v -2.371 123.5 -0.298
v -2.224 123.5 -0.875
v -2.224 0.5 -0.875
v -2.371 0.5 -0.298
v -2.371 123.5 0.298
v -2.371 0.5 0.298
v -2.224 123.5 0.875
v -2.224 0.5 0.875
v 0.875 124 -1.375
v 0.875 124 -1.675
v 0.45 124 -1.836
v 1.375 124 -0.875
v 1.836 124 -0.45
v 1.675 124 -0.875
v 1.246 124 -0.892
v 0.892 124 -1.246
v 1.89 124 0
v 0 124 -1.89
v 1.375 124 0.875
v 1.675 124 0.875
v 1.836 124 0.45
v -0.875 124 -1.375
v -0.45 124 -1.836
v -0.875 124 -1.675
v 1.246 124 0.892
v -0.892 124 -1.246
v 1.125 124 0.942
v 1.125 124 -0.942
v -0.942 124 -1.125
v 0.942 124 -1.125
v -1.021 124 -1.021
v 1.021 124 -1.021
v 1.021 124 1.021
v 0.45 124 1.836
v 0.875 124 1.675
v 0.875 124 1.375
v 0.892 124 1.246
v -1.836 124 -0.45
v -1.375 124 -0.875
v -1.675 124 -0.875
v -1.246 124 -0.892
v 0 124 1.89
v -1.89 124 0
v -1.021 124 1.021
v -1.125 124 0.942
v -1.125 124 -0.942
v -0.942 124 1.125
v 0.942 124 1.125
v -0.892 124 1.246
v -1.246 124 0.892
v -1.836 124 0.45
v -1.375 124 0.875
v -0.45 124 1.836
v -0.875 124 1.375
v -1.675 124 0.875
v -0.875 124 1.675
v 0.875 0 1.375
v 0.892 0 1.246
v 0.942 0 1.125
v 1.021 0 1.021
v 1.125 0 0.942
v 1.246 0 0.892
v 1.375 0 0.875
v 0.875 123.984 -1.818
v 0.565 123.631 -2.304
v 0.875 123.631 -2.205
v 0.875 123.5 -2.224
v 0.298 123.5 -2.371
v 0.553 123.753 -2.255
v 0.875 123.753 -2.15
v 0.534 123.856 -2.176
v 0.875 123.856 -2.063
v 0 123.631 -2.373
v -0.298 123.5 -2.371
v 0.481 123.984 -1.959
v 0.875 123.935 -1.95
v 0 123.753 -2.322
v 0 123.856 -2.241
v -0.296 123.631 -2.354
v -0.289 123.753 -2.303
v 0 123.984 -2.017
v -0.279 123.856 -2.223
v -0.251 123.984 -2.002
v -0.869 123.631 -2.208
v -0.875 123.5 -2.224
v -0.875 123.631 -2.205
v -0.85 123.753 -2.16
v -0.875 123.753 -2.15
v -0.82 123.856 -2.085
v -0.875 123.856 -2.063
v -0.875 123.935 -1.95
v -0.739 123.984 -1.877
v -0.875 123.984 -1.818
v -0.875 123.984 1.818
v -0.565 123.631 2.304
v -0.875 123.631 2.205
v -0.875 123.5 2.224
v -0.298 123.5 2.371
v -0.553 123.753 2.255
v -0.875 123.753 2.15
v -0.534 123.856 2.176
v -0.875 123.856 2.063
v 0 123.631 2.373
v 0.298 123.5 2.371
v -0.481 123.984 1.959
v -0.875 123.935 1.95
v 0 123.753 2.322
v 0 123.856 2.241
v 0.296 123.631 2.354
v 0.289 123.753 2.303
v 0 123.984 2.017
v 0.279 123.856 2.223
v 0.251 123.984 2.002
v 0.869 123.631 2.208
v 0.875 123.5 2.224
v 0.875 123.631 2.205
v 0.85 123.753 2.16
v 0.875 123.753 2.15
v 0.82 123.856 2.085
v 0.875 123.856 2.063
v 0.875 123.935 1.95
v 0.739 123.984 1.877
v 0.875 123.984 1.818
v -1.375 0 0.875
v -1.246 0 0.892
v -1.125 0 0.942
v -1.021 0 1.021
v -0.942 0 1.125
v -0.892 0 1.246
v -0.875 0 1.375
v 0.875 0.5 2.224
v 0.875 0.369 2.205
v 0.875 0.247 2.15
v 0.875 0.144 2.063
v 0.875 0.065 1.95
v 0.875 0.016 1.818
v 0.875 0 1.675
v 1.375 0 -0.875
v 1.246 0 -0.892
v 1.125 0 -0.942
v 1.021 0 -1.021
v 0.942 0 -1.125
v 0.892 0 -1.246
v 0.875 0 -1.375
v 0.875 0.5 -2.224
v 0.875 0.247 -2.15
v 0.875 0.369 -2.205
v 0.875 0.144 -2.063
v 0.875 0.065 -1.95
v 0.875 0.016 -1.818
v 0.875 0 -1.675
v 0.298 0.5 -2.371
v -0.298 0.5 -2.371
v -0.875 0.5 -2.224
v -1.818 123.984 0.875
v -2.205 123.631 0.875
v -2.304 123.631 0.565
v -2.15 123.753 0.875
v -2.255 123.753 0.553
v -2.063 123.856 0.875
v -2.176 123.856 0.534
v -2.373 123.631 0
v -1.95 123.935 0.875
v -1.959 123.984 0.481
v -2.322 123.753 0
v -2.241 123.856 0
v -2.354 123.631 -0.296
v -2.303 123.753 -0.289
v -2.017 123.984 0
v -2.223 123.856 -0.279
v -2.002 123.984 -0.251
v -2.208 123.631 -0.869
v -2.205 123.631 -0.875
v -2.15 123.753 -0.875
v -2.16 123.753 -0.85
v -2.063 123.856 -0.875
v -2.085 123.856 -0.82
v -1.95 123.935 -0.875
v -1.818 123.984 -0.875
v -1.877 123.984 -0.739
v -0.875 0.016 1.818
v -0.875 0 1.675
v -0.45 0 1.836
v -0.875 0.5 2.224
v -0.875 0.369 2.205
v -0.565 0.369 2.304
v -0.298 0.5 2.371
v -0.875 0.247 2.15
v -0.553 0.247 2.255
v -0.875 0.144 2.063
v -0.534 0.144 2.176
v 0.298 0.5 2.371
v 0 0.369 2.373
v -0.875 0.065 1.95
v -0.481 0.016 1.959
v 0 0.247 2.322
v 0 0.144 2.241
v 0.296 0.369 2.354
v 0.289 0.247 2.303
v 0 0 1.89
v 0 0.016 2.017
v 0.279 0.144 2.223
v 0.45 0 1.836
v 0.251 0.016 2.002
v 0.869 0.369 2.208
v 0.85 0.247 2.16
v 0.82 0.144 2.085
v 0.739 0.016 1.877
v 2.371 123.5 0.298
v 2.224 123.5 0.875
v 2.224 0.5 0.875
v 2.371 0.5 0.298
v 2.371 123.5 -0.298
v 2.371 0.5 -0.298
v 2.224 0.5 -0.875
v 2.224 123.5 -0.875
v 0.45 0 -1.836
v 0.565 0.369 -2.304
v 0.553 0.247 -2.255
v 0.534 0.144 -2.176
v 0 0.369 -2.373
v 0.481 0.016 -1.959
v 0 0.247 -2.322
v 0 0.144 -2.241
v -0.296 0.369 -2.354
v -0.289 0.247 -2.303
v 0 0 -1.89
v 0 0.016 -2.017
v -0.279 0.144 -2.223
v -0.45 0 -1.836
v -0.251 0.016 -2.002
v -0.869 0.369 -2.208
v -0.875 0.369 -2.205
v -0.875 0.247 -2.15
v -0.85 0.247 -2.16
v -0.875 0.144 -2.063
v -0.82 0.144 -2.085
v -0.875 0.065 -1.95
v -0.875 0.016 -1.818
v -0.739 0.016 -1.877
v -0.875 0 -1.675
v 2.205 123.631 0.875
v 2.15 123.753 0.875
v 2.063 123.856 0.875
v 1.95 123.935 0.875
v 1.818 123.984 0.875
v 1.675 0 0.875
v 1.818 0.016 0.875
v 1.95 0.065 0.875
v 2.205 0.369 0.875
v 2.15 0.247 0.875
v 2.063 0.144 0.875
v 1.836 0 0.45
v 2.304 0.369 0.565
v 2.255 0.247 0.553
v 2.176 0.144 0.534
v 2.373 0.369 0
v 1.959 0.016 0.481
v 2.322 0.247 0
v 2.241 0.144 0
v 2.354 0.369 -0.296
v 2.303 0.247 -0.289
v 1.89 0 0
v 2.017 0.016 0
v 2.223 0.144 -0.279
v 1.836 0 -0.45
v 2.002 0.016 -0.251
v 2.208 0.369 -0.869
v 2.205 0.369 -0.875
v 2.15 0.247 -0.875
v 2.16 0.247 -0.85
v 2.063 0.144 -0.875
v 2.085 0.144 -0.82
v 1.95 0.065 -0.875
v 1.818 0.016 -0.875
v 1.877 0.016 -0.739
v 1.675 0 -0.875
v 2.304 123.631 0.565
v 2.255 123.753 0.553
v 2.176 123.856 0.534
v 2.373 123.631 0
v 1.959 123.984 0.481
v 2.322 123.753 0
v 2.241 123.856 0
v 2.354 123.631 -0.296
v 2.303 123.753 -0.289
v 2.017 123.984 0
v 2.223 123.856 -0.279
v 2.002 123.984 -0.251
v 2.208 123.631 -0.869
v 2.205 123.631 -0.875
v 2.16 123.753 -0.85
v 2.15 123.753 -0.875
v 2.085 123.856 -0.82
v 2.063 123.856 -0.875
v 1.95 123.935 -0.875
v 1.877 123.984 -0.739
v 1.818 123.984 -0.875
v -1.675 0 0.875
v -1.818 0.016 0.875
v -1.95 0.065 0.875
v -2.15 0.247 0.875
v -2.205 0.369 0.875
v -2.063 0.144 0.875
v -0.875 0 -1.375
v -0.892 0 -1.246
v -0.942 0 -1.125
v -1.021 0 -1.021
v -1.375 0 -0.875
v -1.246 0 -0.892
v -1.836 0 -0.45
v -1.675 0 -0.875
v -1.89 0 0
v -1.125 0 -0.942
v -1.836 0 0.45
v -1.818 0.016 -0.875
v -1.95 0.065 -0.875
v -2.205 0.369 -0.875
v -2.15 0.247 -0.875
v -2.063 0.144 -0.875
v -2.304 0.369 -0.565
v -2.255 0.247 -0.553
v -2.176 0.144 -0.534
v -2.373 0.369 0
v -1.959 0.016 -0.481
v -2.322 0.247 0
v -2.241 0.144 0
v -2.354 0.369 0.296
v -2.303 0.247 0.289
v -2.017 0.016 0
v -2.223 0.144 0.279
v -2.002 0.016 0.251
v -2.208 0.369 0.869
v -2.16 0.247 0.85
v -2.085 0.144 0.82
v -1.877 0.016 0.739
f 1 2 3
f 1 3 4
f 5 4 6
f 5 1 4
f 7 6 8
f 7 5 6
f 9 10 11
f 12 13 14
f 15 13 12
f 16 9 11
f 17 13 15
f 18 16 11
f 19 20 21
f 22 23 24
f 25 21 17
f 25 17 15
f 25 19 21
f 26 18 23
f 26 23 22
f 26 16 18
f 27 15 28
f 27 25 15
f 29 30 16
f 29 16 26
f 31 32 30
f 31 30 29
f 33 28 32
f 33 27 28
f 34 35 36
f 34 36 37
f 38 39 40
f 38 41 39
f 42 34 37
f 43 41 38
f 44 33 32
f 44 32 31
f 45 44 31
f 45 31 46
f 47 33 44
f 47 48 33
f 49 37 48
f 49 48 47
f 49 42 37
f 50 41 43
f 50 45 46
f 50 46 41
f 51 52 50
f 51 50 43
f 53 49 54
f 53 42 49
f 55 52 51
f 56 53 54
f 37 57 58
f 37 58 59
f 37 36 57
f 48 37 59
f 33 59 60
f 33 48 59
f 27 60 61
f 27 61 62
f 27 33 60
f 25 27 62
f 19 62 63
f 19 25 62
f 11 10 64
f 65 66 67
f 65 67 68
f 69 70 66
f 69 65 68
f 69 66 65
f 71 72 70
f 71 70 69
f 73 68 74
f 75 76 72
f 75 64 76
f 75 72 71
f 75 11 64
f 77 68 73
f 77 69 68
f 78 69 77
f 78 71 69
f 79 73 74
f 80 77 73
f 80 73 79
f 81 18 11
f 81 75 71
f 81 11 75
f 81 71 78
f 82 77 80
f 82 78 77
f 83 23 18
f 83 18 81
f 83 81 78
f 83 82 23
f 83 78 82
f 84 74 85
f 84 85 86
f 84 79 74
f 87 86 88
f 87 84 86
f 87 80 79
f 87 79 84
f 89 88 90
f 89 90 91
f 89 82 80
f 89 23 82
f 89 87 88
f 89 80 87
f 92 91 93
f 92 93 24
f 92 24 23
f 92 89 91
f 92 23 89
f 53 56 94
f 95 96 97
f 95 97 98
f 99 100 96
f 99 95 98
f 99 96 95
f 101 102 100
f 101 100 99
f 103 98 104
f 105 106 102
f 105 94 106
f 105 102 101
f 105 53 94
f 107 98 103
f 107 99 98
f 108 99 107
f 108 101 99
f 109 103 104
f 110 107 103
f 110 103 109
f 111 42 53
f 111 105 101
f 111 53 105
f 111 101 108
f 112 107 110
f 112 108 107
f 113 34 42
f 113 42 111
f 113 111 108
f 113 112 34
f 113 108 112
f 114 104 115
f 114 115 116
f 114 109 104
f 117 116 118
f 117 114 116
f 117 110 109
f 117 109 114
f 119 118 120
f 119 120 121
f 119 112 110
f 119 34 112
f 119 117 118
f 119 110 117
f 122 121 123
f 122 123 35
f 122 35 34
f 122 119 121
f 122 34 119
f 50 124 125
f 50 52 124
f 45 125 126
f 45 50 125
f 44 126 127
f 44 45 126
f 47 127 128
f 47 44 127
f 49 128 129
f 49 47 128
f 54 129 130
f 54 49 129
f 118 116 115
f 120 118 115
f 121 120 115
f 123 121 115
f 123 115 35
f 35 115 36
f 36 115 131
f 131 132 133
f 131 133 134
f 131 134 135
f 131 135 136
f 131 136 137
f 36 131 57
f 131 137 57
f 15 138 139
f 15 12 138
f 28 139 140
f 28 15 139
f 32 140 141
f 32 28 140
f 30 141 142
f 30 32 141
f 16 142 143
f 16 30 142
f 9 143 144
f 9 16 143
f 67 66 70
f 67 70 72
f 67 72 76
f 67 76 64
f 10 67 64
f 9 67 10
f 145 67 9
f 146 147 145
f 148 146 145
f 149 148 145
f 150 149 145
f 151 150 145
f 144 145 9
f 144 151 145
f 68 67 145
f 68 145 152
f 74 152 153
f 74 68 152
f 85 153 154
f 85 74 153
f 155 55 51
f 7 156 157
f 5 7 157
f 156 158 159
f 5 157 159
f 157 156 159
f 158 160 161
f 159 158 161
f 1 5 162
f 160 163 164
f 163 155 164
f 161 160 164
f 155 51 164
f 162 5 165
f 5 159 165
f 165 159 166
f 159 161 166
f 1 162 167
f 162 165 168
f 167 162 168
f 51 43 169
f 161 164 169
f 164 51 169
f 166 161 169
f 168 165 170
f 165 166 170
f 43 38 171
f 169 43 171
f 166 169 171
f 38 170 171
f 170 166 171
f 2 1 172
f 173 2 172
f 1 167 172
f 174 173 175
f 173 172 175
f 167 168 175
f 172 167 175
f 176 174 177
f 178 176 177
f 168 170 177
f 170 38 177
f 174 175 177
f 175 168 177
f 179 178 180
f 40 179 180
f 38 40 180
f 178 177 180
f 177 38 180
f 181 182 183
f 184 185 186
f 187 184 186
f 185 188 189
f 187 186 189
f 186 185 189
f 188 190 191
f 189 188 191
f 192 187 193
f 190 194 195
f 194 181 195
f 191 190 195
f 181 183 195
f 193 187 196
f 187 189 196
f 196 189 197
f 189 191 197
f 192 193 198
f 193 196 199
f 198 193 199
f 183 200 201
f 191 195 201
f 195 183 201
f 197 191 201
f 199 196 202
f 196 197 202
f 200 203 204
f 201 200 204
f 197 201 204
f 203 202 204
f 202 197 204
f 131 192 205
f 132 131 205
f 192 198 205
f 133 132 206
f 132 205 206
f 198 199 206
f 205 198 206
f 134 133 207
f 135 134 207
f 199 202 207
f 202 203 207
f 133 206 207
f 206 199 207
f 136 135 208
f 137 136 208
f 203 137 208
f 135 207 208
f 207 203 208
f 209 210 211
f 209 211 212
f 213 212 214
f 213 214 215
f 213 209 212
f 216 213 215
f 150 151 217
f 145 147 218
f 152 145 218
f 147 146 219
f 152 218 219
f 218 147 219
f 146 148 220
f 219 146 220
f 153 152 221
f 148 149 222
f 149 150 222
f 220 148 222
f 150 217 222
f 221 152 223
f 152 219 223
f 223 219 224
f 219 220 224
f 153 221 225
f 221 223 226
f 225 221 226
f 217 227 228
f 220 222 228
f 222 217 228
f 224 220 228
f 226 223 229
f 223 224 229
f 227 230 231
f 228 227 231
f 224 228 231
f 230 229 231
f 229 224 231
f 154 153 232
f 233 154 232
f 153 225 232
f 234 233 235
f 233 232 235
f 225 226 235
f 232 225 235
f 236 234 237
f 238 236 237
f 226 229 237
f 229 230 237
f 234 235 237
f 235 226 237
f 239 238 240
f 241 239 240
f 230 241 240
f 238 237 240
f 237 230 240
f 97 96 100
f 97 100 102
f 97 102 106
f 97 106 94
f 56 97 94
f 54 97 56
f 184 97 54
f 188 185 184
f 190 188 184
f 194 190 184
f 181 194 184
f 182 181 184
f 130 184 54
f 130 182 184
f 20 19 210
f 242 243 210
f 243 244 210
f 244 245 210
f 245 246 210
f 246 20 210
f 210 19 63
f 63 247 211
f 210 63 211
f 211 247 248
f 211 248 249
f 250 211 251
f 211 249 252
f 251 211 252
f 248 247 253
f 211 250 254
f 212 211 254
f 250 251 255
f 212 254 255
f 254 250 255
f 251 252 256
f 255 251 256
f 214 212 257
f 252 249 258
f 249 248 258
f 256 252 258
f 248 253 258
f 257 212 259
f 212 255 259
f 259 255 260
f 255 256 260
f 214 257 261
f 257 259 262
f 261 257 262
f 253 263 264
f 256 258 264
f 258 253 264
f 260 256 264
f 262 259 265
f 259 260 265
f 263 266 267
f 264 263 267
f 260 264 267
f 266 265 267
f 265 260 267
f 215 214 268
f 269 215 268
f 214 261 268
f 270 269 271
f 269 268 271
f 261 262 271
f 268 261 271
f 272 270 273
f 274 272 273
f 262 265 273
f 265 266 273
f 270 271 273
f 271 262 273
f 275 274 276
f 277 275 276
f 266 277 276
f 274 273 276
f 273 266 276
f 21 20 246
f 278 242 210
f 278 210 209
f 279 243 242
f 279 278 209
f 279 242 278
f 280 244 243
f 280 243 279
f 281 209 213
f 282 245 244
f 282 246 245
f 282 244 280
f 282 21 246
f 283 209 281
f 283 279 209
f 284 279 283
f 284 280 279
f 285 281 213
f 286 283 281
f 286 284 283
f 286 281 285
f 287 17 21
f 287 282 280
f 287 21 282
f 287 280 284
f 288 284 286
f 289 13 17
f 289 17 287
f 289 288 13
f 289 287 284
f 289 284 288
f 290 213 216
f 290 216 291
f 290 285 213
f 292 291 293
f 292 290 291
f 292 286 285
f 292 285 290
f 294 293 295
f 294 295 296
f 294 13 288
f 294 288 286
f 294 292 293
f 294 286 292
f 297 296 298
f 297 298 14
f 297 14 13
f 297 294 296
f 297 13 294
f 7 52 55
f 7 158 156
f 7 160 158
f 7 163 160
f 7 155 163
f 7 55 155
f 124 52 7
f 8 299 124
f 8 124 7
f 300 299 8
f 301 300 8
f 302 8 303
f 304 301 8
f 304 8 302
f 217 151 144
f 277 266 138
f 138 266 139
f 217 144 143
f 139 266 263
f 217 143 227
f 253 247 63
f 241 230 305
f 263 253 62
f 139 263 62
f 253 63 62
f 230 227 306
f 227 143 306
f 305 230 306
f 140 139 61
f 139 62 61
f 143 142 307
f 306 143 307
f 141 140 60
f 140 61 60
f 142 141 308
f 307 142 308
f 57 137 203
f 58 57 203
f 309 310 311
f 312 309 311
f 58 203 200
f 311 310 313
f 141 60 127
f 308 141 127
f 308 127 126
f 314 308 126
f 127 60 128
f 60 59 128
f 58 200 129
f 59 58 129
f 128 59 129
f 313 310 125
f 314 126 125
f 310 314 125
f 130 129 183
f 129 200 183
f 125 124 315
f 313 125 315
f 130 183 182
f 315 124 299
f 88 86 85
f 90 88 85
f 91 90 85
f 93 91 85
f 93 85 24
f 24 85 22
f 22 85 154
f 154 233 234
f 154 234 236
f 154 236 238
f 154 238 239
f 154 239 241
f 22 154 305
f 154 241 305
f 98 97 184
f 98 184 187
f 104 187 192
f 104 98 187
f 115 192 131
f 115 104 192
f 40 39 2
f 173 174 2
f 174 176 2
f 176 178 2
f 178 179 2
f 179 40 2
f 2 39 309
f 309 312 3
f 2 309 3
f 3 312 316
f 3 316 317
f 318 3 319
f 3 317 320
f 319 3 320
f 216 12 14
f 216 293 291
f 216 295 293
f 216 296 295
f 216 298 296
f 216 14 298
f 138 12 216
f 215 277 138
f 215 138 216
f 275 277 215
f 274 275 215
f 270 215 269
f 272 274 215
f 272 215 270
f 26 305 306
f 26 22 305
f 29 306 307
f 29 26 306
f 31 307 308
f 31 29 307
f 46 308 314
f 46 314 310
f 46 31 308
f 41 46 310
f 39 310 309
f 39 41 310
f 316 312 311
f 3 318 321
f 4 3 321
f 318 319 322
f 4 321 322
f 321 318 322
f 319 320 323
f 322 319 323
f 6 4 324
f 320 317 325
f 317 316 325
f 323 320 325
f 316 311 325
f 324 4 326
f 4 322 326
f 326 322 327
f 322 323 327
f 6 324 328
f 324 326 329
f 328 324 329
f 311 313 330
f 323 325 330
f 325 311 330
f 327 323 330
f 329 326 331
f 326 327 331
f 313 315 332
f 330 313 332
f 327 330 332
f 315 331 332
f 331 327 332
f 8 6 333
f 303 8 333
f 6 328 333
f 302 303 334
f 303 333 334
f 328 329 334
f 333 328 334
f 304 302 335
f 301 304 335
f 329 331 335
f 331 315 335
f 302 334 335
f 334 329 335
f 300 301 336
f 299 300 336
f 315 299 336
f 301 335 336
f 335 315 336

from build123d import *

# Parameters (mm, degrees)
SKETCH1_W          = 2.39
SKETCH1_H          = 124
CUT_EXTRUDE1_DEPTH = 125.046056769
FILLET1_R          = 0.5


with BuildPart() as part:
    # Sketch1 → Revolve1 (revolve)
    with BuildSketch(Plane(origin=(0, 0, 0), x_dir=(-1, 0, 0), z_dir=(0, 0, -1)), mode=Mode.PRIVATE) as revolve1_sk:
        with Locations((-1.195, 62)):
            Rectangle(SKETCH1_W, SKETCH1_H)
    revolve(revolve1_sk.sketch.rotate(Axis((0, 0, 0), (0, 1, 0)), 180), axis=Axis((0, 0, 0), (0, 1, 0)))

    # Sketch2 → Cut-Extrude1 (cut, through all)
    with BuildSketch(Plane.XZ):
        with BuildLine():
            Line((0.875, 2.22406722), (0.875, 0.875))
            Line((0.875, 0.875), (2.22406722, 0.875))
            ThreePointArc((2.22406722, 0.875), (1.689985207, 1.689985207), (0.875, 2.22406722))
        make_face()
        with BuildLine():
            Line((0.875, -0.875), (2.22406722, -0.875))
            ThreePointArc((2.22406722, -0.875), (1.689985207, -1.689985207), (0.875, -2.22406722))
            Line((0.875, -2.22406722), (0.875, -0.875))
        make_face()
        with BuildLine():
            Line((-0.875, -2.22406722), (-0.875, -0.875))
            Line((-0.875, -0.875), (-2.22406722, -0.875))
            ThreePointArc((-2.22406722, -0.875), (-1.689985207, -1.689985207), (-0.875, -2.22406722))
        make_face()
        with BuildLine():
            Line((-0.875, 0.875), (-2.22406722, 0.875))
            ThreePointArc((-2.22406722, 0.875), (-1.689985207, 1.689985207), (-0.875, 2.22406722))
            Line((-0.875, 2.22406722), (-0.875, 0.875))
        make_face()
    extrude(amount=-CUT_EXTRUDE1_DEPTH, mode=Mode.SUBTRACT)

    # Fillet1
    fillet1_edges = [part.edges().sort_by_distance(p)[0] for p in [
        (2.39, 0, 0),
        (0.875, 62, 0.875),
        (0, 124, -2.39),
        (0, 0, -2.39),
        (0.875, 62, -0.875),
        (-2.39, 124, 0),
        (-2.39, 0, 0),
        (-0.875, 62, -0.875),
        (0, 124, 2.39),
        (0, 0, 2.39),
        (-0.875, 62, 0.875),
        (2.39, 124, 0),
    ]]
    fillet(fillet1_edges, radius=FILLET1_R)


solid = part.part
